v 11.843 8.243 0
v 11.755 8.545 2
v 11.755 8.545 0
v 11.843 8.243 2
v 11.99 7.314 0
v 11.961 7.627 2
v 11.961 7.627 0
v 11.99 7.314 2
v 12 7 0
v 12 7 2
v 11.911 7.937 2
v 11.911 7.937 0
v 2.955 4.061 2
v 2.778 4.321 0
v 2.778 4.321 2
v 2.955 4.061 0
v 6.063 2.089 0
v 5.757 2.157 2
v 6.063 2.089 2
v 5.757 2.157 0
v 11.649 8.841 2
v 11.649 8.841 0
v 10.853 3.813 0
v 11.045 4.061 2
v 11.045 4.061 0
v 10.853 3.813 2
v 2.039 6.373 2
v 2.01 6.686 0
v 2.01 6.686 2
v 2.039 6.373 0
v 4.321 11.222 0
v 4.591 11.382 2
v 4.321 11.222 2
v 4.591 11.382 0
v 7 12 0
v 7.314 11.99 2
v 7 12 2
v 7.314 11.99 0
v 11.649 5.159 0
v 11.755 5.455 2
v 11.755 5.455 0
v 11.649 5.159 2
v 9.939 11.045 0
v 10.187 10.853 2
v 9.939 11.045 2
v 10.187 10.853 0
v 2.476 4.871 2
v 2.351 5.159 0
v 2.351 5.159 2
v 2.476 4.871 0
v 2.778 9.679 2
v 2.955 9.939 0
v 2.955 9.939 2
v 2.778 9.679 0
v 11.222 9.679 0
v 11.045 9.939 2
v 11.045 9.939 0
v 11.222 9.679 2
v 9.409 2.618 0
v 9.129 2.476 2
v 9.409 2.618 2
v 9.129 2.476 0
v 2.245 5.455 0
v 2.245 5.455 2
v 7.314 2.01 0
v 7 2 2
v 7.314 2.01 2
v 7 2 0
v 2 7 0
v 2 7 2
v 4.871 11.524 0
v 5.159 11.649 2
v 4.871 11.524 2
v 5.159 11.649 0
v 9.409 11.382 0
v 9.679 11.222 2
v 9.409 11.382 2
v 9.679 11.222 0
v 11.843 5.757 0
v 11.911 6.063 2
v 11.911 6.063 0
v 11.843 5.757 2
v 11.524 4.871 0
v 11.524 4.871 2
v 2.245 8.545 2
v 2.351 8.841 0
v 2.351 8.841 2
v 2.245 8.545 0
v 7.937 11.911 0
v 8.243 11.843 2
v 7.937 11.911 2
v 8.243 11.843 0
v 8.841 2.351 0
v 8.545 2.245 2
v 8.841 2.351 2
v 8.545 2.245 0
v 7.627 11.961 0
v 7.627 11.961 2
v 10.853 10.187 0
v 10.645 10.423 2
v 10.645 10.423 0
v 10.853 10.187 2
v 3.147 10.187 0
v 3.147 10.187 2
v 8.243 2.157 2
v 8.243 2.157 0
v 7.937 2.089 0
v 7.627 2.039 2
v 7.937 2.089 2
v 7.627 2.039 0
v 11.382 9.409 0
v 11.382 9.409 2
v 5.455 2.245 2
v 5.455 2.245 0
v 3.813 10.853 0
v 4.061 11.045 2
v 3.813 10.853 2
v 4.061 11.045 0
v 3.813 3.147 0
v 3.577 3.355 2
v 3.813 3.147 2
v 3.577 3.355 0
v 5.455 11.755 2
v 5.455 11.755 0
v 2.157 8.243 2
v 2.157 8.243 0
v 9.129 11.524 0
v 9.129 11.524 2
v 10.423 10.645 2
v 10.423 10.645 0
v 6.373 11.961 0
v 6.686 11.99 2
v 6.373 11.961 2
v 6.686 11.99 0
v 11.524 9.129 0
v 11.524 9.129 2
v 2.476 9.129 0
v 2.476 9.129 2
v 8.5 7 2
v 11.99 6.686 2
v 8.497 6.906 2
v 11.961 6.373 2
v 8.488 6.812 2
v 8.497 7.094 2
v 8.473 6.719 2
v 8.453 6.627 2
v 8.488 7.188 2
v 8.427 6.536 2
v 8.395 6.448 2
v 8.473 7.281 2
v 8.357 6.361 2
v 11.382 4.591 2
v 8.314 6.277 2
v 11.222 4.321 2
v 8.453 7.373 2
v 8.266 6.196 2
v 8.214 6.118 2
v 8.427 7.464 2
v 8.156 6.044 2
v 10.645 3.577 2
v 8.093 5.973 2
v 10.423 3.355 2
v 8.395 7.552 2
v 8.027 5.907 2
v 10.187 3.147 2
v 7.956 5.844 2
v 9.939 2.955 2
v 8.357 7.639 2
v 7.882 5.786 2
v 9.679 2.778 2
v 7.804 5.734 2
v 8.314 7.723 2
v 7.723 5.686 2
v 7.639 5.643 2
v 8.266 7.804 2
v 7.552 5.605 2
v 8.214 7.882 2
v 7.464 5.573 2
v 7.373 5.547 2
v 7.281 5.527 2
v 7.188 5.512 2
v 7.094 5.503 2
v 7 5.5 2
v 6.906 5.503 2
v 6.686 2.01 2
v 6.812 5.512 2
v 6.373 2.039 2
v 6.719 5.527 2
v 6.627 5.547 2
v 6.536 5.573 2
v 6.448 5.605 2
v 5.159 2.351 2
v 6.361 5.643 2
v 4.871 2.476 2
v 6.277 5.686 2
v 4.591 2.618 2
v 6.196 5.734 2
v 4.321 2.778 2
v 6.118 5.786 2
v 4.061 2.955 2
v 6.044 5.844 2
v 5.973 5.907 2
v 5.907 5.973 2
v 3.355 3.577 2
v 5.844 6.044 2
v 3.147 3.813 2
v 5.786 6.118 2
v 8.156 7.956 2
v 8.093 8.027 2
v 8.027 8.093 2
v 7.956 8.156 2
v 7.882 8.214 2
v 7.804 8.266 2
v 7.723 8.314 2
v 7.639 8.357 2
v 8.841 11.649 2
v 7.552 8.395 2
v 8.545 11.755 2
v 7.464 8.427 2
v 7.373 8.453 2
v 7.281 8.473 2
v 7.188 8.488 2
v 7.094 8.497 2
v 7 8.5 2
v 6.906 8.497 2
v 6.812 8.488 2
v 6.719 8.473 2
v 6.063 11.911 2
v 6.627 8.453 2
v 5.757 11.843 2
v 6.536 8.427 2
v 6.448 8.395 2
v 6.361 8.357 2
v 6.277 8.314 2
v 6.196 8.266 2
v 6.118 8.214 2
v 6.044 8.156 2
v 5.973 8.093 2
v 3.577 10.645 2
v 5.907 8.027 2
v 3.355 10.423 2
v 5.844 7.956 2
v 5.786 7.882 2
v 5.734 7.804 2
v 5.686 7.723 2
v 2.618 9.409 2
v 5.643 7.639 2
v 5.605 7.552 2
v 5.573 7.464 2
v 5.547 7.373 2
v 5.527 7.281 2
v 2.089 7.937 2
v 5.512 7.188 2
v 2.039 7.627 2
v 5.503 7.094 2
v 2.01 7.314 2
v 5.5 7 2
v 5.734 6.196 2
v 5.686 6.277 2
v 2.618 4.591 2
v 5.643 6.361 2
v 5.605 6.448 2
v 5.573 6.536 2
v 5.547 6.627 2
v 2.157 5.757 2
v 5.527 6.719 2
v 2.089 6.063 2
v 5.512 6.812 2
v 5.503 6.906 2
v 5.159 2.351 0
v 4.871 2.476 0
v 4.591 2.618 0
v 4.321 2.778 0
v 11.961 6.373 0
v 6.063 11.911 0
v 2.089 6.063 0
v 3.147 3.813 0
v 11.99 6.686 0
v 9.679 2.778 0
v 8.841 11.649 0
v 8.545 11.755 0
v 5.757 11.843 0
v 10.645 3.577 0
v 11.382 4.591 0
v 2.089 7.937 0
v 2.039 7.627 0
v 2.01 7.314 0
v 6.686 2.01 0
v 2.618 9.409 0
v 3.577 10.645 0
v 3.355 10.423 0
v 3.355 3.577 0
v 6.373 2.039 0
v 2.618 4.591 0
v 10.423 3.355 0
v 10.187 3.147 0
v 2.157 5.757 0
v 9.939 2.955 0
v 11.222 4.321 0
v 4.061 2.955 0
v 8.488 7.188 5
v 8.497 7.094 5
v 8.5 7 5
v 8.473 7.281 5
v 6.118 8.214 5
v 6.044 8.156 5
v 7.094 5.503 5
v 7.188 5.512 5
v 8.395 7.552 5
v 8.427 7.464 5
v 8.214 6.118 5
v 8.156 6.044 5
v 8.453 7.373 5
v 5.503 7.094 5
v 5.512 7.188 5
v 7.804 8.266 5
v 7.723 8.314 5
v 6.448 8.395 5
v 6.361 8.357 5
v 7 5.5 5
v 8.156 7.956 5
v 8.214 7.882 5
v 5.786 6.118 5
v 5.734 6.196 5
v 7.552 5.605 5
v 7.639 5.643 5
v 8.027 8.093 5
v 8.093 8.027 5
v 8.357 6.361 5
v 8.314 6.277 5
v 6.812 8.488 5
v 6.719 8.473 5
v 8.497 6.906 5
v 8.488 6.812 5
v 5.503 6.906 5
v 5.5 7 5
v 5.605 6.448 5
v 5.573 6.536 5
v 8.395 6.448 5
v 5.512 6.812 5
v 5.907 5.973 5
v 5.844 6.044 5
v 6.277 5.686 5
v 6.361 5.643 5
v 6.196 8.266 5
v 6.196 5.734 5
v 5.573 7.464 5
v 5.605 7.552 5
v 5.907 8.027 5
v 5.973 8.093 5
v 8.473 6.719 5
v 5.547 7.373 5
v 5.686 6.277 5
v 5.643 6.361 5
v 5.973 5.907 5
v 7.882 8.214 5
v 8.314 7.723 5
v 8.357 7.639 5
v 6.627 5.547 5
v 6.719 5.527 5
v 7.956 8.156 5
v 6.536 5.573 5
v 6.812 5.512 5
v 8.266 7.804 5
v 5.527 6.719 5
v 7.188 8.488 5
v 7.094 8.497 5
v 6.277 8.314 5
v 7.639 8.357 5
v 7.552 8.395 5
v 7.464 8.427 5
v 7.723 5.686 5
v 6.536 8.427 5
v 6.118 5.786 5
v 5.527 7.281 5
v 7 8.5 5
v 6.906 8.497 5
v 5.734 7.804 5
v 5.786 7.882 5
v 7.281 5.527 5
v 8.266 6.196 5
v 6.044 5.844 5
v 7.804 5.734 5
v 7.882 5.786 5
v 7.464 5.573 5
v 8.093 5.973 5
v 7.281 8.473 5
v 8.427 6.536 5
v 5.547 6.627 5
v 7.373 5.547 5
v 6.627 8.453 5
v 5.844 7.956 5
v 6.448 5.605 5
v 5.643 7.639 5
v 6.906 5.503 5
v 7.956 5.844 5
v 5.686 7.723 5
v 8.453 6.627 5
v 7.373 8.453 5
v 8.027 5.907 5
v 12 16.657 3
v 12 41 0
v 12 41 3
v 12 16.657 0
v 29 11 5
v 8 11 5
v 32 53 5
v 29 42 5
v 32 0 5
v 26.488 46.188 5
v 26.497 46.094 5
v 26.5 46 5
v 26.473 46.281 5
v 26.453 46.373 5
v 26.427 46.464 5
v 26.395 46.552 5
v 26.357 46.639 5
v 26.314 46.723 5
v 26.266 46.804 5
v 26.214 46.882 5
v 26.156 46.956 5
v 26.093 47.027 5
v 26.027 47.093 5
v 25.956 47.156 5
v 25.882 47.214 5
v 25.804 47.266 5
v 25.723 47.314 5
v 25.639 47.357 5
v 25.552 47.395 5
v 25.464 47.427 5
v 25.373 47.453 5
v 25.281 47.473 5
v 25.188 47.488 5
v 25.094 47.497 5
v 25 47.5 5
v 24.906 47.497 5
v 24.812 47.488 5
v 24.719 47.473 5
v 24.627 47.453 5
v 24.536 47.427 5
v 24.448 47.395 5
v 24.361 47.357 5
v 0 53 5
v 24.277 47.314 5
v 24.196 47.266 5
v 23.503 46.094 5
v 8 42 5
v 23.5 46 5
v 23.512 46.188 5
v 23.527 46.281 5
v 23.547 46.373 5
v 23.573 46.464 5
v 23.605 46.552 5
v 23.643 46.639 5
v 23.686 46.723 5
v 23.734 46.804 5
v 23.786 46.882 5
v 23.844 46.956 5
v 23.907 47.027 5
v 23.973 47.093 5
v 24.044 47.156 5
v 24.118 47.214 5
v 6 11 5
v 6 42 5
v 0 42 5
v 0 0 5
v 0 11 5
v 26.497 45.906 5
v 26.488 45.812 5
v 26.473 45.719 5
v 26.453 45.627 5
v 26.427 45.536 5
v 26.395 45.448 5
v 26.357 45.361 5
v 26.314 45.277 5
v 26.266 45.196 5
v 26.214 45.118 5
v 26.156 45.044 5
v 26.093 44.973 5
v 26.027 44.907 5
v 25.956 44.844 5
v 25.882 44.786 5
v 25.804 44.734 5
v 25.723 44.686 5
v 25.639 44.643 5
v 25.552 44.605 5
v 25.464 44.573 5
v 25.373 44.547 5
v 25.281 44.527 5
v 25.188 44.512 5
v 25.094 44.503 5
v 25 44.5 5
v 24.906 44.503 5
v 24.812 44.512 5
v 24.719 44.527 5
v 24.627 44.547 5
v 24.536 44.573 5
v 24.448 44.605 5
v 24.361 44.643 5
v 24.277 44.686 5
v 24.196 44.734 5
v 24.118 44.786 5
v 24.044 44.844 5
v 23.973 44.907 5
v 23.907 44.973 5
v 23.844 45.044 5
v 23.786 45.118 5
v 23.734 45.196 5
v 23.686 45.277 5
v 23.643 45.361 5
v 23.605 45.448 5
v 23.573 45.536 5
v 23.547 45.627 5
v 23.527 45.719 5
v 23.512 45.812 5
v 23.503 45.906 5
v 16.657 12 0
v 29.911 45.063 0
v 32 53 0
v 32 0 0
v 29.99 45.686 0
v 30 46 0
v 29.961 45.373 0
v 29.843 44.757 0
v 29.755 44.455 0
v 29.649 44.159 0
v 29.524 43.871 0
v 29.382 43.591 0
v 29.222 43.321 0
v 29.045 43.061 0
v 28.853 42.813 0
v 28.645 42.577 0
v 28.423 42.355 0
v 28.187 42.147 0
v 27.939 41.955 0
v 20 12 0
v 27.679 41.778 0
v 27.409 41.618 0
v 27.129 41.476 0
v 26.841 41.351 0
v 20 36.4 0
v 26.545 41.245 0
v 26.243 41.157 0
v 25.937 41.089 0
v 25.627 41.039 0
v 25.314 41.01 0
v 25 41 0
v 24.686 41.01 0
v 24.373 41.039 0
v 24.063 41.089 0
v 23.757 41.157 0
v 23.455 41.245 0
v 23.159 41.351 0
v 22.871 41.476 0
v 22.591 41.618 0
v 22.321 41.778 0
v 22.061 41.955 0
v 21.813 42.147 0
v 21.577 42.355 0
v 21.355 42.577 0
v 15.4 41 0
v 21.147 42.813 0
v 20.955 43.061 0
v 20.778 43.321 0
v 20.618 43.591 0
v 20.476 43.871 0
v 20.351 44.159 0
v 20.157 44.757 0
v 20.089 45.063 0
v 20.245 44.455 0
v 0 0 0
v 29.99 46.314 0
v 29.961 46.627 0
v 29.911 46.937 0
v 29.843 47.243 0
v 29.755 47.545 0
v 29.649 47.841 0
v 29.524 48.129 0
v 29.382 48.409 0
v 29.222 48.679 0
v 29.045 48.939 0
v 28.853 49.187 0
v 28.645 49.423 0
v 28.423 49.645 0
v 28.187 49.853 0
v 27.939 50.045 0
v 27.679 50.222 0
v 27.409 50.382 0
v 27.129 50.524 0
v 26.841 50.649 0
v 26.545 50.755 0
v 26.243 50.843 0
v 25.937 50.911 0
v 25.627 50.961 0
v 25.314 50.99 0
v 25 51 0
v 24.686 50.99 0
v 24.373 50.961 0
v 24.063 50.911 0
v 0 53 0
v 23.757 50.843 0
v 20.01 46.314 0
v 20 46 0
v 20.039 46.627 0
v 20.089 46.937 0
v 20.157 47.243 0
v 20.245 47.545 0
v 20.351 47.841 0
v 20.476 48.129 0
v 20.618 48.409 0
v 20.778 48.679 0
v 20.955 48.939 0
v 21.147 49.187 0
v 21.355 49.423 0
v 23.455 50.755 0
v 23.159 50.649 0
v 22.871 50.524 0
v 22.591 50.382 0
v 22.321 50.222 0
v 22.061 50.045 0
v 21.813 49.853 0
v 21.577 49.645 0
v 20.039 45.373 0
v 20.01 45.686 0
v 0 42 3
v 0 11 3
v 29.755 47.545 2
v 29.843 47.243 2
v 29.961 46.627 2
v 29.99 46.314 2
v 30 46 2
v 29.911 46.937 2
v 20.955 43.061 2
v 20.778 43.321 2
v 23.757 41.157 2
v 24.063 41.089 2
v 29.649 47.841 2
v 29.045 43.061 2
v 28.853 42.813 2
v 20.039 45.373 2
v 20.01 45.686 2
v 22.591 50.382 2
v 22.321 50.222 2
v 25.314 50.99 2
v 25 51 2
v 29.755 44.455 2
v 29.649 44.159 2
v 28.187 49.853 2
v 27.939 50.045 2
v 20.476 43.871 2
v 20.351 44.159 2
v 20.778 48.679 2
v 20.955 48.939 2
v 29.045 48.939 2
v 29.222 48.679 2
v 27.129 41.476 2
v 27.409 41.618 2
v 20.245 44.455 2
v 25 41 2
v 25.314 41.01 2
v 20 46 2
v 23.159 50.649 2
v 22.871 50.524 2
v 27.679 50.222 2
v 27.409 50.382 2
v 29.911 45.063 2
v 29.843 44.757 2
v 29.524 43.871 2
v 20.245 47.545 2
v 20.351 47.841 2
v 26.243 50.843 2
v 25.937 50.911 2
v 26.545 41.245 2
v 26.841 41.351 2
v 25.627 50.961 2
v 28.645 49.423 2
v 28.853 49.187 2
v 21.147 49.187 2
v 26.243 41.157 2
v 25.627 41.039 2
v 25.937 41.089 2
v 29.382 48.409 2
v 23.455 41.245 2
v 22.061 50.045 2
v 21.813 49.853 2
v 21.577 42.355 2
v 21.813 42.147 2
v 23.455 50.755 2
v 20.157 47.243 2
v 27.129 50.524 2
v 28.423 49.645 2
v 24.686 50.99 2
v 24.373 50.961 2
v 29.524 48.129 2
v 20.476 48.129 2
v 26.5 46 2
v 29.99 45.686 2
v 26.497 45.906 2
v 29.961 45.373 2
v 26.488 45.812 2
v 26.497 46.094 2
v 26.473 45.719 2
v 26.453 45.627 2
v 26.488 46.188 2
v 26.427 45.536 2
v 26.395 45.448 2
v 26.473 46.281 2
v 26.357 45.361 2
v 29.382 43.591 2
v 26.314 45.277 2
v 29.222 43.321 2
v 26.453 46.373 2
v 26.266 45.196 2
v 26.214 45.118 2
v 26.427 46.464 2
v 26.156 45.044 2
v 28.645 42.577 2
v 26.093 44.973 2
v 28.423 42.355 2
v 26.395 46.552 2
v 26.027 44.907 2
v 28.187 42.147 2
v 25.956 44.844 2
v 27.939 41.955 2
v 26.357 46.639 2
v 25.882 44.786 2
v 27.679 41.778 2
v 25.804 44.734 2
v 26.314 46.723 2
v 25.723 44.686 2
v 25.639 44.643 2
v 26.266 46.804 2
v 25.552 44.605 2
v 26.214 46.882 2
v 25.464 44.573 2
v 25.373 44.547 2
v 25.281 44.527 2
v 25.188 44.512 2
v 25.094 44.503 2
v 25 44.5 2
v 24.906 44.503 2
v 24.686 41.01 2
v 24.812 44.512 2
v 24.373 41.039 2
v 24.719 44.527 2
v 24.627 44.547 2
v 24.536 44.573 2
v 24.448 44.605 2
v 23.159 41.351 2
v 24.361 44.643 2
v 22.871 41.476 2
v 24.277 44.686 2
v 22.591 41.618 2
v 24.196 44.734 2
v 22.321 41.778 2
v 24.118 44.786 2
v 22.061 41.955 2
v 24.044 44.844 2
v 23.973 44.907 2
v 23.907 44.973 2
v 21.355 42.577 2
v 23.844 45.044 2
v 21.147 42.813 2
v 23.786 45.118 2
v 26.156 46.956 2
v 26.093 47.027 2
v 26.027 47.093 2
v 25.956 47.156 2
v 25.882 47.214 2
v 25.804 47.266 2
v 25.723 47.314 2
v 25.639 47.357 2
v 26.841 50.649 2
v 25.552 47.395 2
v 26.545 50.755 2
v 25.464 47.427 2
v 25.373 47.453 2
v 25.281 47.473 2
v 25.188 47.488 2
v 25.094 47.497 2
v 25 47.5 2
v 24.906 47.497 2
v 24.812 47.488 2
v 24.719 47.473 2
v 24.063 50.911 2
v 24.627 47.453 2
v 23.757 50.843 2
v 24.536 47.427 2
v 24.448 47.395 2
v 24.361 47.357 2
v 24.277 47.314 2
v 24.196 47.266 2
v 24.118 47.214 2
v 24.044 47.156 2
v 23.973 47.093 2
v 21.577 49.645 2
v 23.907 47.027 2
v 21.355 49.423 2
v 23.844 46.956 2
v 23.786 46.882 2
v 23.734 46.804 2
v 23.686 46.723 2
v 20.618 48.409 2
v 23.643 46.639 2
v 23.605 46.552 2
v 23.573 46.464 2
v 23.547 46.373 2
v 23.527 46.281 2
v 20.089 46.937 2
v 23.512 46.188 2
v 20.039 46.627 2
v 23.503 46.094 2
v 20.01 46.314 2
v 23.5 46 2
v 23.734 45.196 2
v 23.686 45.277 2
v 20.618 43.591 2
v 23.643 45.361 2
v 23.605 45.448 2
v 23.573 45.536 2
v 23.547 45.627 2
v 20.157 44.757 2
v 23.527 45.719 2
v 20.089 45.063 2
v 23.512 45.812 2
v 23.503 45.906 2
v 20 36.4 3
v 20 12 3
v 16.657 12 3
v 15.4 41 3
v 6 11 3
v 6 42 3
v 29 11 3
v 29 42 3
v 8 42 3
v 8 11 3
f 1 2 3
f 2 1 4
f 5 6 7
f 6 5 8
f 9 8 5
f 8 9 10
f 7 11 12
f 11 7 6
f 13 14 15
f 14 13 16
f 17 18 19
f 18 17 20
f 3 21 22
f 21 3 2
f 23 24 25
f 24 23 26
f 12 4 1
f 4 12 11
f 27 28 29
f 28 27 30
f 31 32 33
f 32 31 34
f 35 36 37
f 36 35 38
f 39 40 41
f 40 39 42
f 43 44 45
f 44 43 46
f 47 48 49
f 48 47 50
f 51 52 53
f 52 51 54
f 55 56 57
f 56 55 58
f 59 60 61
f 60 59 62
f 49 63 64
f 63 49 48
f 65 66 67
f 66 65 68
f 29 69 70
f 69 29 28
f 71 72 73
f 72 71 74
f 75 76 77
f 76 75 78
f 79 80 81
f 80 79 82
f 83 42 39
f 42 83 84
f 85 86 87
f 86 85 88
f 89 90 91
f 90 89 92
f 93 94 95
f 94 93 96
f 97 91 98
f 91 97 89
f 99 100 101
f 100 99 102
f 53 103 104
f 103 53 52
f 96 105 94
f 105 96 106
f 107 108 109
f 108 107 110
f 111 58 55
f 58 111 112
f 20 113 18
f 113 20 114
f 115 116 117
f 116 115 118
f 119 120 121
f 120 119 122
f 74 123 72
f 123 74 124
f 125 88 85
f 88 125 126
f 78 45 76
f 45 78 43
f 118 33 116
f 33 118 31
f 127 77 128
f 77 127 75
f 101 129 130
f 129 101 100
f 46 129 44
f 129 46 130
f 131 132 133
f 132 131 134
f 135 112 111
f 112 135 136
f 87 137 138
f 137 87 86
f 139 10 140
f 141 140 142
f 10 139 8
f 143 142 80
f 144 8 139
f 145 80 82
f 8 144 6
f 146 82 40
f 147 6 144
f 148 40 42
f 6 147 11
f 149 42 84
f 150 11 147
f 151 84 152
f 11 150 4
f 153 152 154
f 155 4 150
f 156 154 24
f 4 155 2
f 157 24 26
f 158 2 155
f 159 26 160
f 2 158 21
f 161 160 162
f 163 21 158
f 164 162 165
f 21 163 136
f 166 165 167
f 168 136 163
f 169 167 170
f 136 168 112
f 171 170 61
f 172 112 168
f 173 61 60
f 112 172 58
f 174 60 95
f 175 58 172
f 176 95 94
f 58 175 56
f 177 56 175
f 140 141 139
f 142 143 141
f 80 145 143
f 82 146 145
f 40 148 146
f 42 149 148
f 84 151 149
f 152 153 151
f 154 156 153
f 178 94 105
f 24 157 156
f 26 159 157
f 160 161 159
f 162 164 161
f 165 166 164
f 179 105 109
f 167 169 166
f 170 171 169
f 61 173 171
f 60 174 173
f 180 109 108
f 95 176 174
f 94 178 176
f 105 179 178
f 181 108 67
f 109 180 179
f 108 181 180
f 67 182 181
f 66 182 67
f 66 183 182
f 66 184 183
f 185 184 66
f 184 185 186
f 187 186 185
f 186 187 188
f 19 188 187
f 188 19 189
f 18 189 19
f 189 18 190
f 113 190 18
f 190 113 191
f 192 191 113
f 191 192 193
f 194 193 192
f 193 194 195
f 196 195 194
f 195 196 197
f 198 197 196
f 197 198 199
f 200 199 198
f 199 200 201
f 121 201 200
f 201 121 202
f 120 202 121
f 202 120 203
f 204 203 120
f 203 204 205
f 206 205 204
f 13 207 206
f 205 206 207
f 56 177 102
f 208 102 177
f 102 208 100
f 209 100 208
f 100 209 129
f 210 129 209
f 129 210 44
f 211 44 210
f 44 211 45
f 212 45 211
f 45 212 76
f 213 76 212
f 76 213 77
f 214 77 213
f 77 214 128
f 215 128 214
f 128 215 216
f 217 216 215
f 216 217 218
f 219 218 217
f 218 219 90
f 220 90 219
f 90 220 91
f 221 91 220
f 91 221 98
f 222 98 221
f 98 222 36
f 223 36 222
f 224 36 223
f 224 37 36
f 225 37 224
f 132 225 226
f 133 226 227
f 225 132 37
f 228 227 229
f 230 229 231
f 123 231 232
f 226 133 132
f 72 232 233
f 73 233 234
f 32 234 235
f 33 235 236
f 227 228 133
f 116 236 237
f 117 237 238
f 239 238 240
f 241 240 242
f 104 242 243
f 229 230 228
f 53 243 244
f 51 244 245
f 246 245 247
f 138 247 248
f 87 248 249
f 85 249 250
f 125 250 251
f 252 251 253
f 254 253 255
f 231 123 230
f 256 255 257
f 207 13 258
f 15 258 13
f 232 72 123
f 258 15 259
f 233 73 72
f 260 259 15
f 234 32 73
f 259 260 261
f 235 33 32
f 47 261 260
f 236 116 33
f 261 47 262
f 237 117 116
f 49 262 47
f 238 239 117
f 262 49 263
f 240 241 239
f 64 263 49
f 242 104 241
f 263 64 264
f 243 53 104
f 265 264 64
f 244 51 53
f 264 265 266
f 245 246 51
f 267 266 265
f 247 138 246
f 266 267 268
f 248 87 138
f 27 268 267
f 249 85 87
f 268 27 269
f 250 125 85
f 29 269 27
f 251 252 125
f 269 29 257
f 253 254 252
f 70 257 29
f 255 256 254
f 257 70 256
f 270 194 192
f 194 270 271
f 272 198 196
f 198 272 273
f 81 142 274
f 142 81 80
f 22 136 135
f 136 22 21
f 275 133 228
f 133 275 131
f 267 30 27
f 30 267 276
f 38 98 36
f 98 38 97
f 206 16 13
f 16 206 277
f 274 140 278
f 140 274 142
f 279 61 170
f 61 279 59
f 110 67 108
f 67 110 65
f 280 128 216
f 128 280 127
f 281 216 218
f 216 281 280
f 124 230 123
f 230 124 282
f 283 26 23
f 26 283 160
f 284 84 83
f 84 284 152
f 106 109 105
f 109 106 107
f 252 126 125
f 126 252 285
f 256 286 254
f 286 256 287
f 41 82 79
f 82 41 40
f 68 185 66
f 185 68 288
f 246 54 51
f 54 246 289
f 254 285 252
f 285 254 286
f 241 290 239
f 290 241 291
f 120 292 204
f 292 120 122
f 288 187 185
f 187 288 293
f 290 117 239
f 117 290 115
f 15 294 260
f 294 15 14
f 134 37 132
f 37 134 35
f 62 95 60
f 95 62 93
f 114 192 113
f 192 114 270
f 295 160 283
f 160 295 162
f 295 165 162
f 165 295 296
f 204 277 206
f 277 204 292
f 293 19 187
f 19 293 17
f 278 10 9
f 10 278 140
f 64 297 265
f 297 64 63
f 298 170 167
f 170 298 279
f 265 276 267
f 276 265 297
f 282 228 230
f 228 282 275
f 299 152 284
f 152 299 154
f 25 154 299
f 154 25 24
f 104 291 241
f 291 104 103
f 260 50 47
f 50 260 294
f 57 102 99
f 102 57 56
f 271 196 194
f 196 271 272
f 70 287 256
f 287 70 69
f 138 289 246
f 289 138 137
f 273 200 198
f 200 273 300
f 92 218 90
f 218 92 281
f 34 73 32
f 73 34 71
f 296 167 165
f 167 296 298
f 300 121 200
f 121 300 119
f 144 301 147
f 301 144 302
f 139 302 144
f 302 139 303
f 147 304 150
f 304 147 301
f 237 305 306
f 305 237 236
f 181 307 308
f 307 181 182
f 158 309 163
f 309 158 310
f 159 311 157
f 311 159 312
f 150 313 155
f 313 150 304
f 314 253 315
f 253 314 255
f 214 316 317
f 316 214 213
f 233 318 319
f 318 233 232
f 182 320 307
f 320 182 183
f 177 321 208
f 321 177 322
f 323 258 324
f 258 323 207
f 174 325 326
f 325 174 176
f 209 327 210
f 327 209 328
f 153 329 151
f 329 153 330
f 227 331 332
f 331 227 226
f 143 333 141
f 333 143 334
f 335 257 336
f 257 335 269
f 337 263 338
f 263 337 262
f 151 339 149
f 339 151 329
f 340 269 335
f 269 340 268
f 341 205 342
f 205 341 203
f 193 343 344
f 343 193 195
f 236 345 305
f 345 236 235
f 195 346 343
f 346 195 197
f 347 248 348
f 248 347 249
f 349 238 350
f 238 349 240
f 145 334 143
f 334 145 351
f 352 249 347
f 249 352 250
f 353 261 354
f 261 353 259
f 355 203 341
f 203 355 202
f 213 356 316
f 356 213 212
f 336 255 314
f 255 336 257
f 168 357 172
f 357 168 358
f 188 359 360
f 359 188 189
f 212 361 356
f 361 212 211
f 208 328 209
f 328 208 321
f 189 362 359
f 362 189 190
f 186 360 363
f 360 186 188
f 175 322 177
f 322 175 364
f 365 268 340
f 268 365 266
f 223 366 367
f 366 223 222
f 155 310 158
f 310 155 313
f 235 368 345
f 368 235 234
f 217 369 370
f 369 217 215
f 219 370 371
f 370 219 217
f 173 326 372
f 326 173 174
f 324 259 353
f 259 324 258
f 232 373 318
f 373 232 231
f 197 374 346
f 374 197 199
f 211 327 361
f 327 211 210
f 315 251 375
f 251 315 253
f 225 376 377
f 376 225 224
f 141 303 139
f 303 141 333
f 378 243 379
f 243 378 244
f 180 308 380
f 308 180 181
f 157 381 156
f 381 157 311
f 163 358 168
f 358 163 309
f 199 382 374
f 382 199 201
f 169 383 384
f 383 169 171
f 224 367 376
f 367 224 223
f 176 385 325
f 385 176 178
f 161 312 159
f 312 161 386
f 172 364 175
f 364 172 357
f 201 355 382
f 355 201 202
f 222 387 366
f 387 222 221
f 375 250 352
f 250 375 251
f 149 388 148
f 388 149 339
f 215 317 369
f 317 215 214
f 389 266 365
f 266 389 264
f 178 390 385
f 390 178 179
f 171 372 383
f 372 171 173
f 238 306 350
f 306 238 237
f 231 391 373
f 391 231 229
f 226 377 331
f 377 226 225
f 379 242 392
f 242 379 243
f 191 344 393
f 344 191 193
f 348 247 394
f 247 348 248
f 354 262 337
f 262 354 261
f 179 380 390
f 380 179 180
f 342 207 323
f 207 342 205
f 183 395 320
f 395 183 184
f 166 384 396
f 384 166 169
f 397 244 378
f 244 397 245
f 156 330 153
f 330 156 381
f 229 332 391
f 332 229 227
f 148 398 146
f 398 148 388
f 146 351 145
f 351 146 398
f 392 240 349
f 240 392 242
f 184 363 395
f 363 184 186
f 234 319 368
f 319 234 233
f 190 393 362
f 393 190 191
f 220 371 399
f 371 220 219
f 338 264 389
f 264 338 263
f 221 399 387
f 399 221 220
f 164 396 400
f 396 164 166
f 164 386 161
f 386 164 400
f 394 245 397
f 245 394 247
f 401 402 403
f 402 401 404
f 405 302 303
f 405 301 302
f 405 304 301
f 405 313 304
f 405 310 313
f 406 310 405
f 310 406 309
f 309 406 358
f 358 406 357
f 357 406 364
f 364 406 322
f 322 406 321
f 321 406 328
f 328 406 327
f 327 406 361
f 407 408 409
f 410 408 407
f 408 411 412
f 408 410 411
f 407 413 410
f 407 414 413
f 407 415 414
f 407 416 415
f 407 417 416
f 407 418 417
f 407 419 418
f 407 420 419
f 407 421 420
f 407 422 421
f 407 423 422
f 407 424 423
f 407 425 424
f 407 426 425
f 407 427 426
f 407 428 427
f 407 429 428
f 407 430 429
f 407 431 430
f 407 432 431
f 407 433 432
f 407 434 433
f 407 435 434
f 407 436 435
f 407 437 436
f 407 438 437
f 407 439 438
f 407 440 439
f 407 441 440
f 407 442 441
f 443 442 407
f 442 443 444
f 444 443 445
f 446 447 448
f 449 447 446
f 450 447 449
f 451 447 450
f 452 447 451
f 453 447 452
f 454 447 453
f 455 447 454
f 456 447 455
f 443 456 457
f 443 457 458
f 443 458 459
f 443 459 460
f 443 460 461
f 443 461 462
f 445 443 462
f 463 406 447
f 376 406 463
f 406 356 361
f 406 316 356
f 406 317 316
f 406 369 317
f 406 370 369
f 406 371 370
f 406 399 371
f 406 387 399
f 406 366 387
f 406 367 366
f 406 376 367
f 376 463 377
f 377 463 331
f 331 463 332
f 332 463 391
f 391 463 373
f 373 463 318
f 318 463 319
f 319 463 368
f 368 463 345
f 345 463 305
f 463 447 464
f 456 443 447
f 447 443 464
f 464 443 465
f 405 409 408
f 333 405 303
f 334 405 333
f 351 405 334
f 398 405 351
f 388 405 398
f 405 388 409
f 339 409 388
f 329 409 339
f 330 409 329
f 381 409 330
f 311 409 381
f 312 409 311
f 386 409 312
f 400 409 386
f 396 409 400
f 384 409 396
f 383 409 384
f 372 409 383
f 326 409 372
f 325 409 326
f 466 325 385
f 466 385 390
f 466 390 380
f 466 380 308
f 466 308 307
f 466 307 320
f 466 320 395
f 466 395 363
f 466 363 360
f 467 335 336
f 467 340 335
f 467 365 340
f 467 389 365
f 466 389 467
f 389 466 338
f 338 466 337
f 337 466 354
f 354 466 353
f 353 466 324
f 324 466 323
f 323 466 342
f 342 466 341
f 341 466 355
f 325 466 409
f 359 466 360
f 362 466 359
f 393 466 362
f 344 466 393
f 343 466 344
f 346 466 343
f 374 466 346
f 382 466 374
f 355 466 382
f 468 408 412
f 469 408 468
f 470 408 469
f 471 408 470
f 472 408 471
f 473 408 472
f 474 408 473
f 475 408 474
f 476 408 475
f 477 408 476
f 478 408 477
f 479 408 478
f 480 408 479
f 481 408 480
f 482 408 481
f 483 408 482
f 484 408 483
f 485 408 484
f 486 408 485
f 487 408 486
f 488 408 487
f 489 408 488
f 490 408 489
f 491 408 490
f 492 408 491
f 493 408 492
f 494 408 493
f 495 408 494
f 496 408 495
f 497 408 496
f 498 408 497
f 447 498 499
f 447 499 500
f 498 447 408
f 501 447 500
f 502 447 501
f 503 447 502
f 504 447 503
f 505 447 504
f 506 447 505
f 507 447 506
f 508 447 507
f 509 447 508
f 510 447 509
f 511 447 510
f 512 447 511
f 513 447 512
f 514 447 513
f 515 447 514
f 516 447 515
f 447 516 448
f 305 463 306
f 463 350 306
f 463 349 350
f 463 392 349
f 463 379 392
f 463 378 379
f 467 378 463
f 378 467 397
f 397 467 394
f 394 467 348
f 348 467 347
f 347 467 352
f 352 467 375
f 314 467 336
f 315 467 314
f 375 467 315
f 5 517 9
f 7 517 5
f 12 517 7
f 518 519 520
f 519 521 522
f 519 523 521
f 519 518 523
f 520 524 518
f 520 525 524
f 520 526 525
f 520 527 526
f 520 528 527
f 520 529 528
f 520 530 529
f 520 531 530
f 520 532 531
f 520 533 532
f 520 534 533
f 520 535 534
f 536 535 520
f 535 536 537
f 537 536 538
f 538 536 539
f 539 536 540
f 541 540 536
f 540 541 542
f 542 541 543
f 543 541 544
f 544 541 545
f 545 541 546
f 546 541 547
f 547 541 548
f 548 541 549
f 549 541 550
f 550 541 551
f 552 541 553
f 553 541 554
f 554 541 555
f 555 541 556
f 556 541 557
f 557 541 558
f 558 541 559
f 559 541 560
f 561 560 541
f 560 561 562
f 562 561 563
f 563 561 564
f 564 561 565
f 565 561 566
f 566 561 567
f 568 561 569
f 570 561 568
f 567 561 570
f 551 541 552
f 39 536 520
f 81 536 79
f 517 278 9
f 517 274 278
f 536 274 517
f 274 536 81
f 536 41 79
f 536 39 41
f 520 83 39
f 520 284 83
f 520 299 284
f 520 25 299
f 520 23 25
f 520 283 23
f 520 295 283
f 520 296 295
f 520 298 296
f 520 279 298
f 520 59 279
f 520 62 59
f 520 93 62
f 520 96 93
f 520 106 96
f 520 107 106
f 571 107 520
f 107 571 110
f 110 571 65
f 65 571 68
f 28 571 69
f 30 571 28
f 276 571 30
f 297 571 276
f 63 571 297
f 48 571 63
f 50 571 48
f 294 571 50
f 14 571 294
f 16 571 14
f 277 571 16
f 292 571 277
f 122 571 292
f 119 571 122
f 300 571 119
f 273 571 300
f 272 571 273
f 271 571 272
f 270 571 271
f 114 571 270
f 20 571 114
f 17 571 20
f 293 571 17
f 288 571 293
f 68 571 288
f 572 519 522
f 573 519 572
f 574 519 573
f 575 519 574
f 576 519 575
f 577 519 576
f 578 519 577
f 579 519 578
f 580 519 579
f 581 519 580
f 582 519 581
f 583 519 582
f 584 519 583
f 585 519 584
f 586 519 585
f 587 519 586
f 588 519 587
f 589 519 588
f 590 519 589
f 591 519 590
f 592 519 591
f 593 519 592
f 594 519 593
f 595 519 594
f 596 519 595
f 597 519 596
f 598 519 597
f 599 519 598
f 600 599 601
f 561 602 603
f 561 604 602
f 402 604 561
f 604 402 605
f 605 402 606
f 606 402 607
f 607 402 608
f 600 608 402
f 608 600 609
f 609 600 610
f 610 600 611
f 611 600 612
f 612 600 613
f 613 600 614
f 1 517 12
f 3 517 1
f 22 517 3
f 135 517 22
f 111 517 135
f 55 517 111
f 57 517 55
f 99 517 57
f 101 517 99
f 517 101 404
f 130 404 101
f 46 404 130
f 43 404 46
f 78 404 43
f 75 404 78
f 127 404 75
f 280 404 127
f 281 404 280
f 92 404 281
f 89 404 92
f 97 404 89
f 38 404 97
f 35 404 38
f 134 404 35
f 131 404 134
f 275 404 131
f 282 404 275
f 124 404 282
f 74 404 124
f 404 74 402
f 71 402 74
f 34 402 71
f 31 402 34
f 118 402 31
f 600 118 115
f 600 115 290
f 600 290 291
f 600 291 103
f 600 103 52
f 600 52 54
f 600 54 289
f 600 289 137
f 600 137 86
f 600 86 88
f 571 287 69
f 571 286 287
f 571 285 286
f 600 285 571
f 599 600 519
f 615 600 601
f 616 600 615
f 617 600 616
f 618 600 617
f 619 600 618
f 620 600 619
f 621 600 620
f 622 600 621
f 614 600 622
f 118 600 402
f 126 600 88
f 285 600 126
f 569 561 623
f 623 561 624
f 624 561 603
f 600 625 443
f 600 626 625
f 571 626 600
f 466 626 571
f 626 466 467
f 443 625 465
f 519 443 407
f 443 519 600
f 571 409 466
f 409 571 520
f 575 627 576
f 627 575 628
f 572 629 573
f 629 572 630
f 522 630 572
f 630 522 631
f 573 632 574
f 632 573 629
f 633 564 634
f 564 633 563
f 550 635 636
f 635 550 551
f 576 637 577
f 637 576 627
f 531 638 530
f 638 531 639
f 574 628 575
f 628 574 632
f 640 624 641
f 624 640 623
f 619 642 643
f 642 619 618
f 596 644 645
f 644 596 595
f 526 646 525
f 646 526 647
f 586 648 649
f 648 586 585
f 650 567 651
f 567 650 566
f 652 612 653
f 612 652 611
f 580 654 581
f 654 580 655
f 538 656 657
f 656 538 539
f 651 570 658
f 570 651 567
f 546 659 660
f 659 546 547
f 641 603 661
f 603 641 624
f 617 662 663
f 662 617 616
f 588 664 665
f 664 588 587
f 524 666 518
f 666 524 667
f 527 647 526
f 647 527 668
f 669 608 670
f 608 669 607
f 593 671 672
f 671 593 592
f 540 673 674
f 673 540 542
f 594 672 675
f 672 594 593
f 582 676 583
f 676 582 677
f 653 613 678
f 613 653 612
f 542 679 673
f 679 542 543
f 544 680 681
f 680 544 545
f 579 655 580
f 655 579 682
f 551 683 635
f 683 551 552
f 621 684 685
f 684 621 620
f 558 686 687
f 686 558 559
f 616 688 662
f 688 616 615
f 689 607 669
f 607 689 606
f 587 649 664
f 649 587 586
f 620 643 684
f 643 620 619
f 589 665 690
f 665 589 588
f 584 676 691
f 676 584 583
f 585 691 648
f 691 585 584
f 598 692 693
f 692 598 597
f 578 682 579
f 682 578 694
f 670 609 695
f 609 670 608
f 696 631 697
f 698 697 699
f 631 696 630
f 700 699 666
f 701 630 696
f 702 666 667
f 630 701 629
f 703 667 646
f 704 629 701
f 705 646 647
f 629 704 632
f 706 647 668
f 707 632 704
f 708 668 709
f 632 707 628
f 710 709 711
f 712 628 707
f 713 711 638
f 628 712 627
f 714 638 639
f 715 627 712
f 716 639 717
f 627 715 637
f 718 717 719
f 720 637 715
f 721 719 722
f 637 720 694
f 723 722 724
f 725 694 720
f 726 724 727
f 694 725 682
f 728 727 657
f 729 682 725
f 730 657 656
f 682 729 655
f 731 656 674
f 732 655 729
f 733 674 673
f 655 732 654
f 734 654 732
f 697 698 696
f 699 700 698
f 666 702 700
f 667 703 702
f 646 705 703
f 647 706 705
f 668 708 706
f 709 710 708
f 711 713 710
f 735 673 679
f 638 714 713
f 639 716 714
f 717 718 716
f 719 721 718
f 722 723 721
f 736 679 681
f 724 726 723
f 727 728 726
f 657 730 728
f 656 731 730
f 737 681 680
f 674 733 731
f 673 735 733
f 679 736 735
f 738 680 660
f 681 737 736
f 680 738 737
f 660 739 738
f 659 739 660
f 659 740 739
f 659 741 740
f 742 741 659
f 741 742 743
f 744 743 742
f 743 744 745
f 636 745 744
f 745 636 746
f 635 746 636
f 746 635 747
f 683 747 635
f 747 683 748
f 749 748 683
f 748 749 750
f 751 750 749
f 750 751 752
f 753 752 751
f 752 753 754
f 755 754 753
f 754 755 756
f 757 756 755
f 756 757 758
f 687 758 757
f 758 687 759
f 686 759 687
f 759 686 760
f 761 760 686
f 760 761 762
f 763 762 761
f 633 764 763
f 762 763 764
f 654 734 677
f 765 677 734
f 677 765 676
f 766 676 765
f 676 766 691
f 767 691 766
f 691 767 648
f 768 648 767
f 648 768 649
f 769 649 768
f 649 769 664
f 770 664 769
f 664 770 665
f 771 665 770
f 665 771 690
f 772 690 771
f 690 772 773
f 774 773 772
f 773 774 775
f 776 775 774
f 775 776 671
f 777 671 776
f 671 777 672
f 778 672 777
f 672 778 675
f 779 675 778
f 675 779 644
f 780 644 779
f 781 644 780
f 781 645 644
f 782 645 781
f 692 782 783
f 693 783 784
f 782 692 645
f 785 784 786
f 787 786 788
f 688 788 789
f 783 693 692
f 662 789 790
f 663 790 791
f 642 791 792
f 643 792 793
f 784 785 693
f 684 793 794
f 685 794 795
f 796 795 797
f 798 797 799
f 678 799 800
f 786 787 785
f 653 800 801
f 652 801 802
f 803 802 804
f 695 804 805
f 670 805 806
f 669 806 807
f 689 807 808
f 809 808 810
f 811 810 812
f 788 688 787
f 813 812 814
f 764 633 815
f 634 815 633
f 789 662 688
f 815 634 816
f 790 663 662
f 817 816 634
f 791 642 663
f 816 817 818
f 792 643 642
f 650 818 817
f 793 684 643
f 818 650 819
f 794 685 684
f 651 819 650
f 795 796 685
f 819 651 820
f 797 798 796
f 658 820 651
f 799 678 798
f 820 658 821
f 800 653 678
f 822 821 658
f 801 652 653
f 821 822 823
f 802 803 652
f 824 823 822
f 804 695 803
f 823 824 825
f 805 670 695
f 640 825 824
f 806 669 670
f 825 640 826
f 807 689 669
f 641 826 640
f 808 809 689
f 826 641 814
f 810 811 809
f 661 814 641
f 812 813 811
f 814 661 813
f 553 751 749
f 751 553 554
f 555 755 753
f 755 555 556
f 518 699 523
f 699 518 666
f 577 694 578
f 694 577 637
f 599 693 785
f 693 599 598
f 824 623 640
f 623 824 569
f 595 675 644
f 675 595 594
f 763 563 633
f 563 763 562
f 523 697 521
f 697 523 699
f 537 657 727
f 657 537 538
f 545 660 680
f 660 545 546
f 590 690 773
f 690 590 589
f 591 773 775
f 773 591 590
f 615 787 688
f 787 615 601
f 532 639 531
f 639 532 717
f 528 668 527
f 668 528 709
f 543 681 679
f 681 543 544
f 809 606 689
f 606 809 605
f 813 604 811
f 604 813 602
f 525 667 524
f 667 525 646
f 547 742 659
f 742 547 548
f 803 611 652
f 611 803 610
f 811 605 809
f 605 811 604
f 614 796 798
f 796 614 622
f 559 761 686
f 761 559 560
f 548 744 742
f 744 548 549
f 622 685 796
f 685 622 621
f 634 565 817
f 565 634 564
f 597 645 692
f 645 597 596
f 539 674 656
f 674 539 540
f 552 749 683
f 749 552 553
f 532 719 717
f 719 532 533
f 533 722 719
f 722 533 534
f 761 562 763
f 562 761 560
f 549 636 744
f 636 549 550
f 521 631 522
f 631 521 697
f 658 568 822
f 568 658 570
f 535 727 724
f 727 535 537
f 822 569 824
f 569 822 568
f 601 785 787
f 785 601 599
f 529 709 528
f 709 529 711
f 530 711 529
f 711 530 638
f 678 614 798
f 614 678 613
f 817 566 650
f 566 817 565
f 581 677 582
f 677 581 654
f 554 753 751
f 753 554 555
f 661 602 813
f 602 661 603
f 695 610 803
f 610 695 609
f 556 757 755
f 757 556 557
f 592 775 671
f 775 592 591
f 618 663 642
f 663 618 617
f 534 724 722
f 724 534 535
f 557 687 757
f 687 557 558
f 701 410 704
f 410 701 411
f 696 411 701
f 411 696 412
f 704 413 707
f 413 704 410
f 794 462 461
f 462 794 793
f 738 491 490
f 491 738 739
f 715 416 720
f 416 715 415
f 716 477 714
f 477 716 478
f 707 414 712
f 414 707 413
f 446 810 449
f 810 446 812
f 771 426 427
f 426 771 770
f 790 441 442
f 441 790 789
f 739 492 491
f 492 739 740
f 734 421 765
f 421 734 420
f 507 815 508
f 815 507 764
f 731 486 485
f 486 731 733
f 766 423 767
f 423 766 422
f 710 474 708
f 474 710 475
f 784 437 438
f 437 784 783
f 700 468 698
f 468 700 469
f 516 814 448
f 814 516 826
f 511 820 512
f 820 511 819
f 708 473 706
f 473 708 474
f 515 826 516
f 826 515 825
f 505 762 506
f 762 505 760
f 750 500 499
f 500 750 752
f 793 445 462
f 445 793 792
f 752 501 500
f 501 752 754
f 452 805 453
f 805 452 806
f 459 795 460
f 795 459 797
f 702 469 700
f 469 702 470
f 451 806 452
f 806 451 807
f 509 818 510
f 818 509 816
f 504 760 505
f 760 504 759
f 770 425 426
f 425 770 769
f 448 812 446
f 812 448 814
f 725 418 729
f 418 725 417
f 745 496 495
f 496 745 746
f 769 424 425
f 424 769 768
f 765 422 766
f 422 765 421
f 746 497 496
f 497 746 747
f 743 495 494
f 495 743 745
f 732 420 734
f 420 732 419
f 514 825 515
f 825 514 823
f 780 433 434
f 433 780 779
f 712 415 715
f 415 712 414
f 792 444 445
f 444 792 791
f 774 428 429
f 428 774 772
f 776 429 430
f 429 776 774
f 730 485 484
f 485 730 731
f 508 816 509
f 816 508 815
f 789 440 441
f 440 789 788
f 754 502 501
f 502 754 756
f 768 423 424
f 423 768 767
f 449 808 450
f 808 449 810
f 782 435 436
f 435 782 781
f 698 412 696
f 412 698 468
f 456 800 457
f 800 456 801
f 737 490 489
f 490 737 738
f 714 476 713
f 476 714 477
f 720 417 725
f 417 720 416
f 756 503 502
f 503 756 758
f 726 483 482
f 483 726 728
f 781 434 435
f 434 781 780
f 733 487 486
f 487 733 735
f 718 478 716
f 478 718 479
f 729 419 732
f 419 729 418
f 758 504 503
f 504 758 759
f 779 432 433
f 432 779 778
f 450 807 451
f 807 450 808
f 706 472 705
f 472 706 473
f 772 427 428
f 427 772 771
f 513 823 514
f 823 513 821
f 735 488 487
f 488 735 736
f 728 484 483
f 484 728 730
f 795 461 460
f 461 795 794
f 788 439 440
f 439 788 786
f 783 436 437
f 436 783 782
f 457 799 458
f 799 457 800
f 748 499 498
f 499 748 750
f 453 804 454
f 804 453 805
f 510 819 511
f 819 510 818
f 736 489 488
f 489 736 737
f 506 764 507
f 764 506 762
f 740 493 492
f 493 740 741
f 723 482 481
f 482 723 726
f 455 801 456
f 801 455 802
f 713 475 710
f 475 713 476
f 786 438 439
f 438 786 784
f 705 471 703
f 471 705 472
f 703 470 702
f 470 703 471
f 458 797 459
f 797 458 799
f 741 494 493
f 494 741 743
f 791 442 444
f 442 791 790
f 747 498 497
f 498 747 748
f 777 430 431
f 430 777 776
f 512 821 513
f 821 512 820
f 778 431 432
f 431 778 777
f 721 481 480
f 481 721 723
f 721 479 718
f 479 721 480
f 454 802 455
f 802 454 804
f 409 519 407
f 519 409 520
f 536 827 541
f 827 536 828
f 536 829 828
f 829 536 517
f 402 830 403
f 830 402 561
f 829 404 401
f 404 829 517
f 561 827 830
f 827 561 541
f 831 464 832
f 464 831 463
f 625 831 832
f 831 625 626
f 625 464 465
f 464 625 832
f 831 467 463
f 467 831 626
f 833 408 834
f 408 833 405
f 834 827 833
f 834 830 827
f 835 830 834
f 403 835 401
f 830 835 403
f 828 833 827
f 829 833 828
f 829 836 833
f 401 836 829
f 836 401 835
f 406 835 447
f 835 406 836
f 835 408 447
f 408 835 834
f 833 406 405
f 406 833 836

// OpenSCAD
$fn = 100; // Разрешение поверхности.

module hole() {
	union() {
		translate([0, 0, -2.5]) {
			cylinder(h = 3.5, r = 5);
		}
		cylinder(h = 8, r = 1.5);
	}
}

module skos() {
	rotate([0, 0, -45]) {
		cube([10, 4, 5]);
	}
}

module skos2() {
	rotate([0, 0, 45]) {
		cube([10, 4, 5]);
	}
}

// Основа:
module base() {
	union() {
		difference() {
			translate([-1, -1, -1]) { cube([12, 53, 5]); }
			translate([6, 6, 0]) { hole(); }
			//translate([6, 45, 0]) { hole(); }
			
		}
		difference() {
			translate([19, -1, -1]) { cube([12, 53, 5]); }
			//translate([24, 6, 0]) { hole(); }
			translate([24, 45, 0]) { hole(); }
		}
		translate([11, -1, -1]) { cube([8, 12, 5]); }
		translate([11, 40, -1]) { cube([8, 12, 5]); }
		// Диагональ:
		translate([ 7, 14, -1]) { skos(); }
		translate([13.2, 41.2, -1]) { skos(); }
	}
}

// Деталь полностью:
union() {
	translate([1, 1, 1]) {
		difference() {
			base();
			// Место под верхние резисторы:
			translate([-2, 10, 2]) { cube([7, 31, 3]); }
			// Центральные резисторы:
			translate([7, 10, 2]) { cube([21, 31, 3]); }
		}
	}
}
